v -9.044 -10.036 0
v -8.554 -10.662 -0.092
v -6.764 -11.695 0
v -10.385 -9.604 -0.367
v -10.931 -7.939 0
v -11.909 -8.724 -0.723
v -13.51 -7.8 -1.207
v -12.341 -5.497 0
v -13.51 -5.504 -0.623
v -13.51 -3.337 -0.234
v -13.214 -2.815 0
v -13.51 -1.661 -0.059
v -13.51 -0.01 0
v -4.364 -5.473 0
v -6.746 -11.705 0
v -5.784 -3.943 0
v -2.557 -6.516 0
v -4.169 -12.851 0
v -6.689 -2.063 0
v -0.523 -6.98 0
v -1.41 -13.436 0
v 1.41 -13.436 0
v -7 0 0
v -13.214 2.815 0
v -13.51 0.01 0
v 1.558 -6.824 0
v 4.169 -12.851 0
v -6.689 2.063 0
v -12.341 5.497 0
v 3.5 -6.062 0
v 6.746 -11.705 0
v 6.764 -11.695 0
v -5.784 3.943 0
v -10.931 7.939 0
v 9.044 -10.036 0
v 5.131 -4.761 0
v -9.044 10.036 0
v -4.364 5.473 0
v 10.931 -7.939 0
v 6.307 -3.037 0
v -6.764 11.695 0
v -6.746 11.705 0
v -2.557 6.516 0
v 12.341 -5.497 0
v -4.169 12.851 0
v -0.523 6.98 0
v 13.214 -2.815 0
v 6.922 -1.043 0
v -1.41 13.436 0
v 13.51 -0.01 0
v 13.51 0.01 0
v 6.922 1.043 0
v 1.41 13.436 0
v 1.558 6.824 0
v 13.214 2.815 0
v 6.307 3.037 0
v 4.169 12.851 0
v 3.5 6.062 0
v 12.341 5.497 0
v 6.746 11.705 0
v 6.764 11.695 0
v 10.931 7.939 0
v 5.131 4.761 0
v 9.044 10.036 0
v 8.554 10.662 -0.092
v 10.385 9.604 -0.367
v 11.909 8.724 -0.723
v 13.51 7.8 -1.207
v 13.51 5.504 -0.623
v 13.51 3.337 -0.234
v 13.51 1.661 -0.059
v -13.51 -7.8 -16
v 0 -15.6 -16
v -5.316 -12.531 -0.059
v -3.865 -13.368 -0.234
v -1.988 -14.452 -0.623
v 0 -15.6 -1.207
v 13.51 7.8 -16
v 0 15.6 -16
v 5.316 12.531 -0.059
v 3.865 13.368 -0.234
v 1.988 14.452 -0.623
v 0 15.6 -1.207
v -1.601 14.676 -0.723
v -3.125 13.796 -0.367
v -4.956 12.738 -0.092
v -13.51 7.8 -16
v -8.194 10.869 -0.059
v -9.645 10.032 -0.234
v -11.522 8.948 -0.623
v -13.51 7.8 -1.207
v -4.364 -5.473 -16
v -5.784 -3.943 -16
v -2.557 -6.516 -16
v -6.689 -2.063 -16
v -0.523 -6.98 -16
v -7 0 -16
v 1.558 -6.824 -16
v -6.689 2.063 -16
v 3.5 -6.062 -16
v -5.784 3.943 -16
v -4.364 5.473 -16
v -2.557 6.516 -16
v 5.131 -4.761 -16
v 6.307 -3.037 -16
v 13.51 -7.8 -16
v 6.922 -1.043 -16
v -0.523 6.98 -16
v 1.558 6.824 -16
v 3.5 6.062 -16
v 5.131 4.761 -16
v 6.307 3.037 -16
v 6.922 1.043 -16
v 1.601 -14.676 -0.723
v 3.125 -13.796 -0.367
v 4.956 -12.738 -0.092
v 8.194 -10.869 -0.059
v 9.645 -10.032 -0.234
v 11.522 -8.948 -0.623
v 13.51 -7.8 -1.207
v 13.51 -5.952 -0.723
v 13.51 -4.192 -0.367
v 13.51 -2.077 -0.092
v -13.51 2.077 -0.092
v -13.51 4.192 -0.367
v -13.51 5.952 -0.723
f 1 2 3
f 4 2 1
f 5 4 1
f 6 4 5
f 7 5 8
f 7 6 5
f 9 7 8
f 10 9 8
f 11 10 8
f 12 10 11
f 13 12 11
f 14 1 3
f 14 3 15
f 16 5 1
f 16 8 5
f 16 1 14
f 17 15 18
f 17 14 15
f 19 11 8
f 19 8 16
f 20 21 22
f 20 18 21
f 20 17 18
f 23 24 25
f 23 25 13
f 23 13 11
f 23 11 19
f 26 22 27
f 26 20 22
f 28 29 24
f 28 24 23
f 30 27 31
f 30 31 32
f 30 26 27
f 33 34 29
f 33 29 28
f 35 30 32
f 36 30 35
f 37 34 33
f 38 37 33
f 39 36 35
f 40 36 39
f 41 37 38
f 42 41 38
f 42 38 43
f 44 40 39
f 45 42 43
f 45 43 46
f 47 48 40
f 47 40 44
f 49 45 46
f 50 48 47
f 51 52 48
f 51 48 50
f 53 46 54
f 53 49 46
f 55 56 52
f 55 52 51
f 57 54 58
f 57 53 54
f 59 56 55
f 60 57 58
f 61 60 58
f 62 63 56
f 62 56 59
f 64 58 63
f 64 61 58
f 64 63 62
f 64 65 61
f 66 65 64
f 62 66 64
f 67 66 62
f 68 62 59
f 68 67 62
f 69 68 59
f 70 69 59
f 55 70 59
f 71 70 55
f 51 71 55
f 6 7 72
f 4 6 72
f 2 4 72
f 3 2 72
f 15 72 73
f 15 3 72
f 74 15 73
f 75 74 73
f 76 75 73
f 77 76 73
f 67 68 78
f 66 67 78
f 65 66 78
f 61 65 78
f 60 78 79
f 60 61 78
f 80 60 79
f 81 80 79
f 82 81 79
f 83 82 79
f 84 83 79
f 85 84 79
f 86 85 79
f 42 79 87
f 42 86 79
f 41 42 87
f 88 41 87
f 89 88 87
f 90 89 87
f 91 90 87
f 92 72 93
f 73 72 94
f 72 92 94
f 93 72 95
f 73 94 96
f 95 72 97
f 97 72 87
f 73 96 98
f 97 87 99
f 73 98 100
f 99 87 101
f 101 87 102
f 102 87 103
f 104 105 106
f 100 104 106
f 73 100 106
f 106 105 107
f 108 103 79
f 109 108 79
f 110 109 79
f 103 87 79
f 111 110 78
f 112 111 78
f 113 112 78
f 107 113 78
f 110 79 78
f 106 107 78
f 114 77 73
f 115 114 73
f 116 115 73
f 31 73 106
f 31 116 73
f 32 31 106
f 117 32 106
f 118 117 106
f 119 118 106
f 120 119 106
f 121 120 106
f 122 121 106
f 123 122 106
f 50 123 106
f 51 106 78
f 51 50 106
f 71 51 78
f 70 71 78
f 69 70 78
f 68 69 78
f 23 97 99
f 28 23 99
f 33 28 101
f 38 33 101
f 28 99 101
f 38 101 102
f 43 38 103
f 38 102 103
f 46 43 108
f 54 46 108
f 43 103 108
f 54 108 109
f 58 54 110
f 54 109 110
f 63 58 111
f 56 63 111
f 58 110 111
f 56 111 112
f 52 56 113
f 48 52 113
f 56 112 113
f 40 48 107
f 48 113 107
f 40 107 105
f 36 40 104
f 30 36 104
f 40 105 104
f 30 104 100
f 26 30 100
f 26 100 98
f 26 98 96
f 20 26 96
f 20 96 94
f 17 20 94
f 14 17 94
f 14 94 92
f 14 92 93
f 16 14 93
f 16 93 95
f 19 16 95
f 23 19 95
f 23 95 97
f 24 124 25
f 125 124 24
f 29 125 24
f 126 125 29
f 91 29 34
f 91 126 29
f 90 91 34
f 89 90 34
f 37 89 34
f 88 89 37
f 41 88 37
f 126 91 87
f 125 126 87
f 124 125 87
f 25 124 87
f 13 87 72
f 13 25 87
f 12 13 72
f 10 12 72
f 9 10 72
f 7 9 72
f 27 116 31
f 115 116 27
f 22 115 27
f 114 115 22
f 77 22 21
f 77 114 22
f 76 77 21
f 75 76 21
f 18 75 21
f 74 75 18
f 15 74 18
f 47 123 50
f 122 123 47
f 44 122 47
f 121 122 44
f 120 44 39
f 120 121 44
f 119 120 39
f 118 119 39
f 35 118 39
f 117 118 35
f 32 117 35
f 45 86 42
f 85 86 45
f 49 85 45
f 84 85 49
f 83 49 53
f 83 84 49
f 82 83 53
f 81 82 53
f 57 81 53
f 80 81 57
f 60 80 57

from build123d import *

# Parameters (mm, degrees)
F1_DEPTH = 16
F4_D     = 14


with BuildPart() as f1:
    # F0 (on Top) → F1 (new body)
    with BuildSketch(Plane.XY):
        Polygon((13.509996299, -7.8), (13.509996299, 7.8), (0, 15.6), (-13.509996299, 7.8), (-13.509996299, -7.8), (0, -15.6), align=None)
    extrude(amount=-F1_DEPTH)

    # F2 (on Front) → F3 (revolve, cut)
    with BuildSketch(Plane.XZ):
        Polygon((16, -1.4376021703), (16, 0), (13.51, 0), align=None)
    revolve(axis=Axis((0, 0, -8), (0, 0, -1)), mode=Mode.SUBTRACT)

    # F4 (through all)
    with Locations(Plane.XY):
        with Locations((0, 0)):
            Hole(F4_D / 2)


solid = f1.part
